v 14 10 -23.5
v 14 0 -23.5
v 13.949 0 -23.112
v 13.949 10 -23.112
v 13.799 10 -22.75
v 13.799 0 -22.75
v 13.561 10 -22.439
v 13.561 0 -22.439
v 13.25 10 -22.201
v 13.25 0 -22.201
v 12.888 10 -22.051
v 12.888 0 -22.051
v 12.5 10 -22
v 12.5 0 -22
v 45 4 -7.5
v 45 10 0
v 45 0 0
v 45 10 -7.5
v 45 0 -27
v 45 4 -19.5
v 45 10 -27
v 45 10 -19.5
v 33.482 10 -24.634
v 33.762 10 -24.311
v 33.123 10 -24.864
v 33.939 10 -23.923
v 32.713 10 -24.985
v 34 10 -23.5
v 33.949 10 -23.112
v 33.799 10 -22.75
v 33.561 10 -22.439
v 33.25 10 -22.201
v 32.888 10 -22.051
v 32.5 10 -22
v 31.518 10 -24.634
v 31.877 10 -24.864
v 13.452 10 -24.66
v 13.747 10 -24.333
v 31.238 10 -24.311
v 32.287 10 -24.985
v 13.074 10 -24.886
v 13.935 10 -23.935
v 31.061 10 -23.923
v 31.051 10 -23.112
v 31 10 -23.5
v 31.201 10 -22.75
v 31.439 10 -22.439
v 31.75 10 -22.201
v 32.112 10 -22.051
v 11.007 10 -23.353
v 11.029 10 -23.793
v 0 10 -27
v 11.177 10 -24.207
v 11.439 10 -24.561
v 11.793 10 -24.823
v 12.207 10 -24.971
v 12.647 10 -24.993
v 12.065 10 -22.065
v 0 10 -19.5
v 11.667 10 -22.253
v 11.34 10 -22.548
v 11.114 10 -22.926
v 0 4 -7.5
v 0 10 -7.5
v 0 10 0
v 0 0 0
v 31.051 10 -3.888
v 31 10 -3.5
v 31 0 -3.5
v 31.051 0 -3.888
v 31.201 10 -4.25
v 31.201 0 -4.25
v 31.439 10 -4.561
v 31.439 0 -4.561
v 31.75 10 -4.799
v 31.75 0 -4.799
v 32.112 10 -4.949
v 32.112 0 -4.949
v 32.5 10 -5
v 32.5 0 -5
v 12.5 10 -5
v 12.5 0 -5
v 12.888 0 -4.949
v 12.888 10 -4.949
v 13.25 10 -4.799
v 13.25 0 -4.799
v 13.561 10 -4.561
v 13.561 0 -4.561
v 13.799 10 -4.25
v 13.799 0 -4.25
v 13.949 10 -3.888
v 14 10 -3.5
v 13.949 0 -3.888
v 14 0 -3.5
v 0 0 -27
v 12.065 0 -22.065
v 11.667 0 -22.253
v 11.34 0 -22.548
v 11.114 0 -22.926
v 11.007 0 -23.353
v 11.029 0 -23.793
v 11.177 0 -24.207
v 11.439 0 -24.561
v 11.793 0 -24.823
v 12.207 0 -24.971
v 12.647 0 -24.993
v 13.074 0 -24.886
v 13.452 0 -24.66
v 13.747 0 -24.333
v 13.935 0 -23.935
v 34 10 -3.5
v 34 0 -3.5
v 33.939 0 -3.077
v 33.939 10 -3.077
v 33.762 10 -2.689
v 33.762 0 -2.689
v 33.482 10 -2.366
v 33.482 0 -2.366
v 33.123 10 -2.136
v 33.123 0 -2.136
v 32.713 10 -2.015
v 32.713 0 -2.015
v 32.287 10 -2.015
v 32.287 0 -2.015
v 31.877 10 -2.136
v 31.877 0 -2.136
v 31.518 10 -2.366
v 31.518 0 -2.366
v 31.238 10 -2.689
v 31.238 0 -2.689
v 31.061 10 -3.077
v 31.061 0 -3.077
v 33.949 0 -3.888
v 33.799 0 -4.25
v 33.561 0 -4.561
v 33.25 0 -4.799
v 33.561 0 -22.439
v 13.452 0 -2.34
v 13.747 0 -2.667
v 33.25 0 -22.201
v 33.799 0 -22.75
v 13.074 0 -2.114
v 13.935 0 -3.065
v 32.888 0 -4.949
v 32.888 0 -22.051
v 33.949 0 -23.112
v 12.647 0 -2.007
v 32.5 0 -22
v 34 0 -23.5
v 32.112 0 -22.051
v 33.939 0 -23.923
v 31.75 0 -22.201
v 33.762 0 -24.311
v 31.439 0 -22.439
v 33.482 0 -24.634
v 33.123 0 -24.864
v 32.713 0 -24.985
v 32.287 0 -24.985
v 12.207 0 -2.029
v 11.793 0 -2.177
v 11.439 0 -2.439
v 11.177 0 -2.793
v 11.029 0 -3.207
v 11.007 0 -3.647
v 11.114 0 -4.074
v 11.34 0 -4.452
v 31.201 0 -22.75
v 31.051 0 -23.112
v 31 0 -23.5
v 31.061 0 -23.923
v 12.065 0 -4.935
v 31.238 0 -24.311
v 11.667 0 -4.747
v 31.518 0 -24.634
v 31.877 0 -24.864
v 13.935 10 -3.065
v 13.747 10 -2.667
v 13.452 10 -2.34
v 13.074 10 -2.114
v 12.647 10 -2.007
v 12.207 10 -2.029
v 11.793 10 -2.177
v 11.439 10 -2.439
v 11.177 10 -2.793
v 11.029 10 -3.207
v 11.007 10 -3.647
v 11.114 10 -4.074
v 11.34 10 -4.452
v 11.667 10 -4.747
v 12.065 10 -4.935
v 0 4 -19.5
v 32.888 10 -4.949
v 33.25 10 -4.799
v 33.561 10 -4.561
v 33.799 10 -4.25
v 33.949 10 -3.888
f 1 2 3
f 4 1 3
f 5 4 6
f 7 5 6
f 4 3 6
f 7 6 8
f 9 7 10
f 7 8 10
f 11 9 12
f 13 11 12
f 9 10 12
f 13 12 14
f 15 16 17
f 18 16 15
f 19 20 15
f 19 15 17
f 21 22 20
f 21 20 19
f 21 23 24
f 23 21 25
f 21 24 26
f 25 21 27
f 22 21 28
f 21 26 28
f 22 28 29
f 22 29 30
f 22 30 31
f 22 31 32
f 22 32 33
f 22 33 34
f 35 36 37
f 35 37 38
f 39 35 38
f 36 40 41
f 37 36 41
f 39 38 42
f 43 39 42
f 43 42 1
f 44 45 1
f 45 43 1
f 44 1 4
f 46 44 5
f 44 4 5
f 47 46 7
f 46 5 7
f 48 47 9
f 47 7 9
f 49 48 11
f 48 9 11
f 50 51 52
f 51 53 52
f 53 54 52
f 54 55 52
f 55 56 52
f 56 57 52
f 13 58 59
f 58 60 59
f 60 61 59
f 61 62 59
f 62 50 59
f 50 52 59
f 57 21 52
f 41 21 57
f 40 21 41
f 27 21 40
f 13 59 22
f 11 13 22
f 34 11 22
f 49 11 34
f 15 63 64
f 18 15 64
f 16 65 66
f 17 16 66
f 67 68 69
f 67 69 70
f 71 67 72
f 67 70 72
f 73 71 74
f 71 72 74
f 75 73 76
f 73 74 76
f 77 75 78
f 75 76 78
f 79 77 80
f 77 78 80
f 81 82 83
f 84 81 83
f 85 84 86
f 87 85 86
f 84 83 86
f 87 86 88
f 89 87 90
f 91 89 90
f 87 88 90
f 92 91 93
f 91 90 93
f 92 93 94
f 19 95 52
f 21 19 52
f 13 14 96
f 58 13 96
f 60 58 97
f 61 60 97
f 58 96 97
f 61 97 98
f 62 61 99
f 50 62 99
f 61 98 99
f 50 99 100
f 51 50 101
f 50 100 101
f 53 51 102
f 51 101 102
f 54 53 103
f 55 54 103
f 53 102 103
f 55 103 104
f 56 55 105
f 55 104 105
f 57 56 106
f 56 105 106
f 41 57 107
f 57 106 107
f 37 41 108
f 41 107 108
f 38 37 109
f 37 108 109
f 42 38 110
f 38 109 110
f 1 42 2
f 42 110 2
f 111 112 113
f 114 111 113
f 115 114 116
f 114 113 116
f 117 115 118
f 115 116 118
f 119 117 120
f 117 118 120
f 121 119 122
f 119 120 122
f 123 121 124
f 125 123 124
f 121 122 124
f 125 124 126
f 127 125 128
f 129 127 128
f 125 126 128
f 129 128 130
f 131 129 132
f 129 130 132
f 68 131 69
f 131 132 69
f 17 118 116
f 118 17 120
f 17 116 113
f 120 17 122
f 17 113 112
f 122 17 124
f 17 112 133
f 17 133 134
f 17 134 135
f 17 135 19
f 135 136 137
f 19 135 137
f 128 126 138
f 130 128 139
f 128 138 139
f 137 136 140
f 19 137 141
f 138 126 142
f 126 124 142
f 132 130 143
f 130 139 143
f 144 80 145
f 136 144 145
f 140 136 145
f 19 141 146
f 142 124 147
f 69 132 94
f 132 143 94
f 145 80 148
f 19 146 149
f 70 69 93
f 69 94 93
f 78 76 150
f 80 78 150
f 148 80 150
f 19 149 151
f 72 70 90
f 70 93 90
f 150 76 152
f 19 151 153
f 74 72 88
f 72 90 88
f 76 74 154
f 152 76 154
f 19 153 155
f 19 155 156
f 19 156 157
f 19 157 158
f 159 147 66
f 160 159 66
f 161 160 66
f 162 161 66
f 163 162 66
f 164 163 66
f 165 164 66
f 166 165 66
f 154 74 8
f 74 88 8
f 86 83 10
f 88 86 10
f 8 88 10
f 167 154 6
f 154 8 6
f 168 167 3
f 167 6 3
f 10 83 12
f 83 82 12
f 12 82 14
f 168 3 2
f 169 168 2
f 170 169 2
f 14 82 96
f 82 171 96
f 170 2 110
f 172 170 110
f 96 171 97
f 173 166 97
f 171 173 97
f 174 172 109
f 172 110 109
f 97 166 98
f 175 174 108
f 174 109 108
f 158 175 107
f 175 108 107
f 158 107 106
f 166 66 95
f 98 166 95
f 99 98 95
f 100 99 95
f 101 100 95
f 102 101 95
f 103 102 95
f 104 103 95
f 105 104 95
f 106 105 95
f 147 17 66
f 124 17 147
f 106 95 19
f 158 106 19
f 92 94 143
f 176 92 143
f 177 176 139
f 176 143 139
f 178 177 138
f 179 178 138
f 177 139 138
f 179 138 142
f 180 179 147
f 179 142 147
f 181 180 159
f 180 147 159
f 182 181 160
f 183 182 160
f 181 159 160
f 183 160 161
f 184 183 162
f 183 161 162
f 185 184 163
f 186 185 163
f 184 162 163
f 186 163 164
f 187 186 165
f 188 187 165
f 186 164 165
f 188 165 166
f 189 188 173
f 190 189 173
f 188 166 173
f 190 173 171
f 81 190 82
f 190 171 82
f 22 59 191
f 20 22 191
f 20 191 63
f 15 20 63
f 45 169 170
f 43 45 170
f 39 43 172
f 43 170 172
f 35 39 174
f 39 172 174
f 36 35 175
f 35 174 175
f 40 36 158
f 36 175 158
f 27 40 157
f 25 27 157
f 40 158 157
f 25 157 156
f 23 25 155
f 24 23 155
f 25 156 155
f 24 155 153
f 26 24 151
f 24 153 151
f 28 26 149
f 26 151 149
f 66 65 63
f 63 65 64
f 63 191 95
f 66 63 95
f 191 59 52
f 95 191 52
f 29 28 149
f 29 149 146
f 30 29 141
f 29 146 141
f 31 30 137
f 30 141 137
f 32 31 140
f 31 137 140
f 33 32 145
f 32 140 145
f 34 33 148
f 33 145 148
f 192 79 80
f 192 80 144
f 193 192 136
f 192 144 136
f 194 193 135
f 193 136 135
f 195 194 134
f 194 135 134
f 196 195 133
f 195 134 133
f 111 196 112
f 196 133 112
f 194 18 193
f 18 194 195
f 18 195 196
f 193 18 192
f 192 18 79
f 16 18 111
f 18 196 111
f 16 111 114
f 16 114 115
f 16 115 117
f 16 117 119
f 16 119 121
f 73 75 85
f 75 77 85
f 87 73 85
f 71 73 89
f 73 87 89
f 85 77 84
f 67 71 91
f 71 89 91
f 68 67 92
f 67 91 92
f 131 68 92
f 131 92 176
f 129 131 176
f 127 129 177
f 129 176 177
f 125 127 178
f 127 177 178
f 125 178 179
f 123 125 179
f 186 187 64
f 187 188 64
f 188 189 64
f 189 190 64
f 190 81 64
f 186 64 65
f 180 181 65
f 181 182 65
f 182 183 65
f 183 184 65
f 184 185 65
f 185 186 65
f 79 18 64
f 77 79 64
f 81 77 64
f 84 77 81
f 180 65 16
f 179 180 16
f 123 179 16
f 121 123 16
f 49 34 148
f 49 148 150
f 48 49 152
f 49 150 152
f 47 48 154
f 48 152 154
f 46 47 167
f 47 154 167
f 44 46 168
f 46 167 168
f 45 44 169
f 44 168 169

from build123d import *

# Parameters (mm, degrees)
BOSS_EXTRUDE1_DEPTH = 45
CUT_EXTRUDE1_DEPTH  = 45


with BuildPart() as part:
    # Sketch1 → Boss-Extrude1 (new body)
    with BuildSketch(Plane(origin=(0, 0, 0), x_dir=(0, 0, -1), z_dir=(1, 0, 0))):
        Polygon((0, 0), (27, 0), (27, 10), (19.5, 10), (19.5, 4), (7.5, 4), (7.5, 10), (0, 10), align=None)
    extrude(amount=BOSS_EXTRUDE1_DEPTH)

    # Sketch2 → Cut-Extrude1 (cut)
    with BuildSketch(Plane.XZ):
        with BuildLine():
            ThreePointArc((31, -3.5), (31.439339828, -4.560660172), (32.5, -5))
            Line((32.5, -5), (32.5, -3.5))
            Line((32.5, -3.5), (31, -3.5))
        make_face()
        with BuildLine():
            Line((32.5, -3.5), (32.5, -5))
            ThreePointArc((32.5, -5), (33.560660172, -4.560660172), (34, -3.5))
            ThreePointArc((34, -3.5), (32.5, -2), (31, -3.5))
            Line((31, -3.5), (32.5, -3.5))
        make_face()
        with BuildLine():
            ThreePointArc((32.5, -22), (31.439339828, -22.439339828), (31, -23.5))
            Line((31, -23.5), (32.5, -23.5))
            Line((32.5, -23.5), (32.5, -22))
        make_face()
        with BuildLine():
            Line((32.5, -23.5), (31, -23.5))
            ThreePointArc((31, -23.5), (32.5, -25), (34, -23.5))
            ThreePointArc((34, -23.5), (33.560660172, -22.439339828), (32.5, -22))
            Line((32.5, -22), (32.5, -23.5))
        make_face()
        with BuildLine():
            Line((12.5, -22), (12.5, -23.5))
            Line((12.5, -23.5), (14, -23.5))
            ThreePointArc((14, -23.5), (13.560660172, -22.439339828), (12.5, -22))
        make_face()
        with BuildLine():
            Line((14, -23.5), (12.5, -23.5))
            Line((12.5, -23.5), (12.5, -22))
            ThreePointArc((12.5, -22), (11.439339828, -24.560660172), (14, -23.5))
        make_face()
        with BuildLine():
            ThreePointArc((14, -3.5), (11.439339828, -2.439339828), (12.5, -5))
            Line((12.5, -5), (12.5, -3.5))
            Line((12.5, -3.5), (14, -3.5))
        make_face()
        with BuildLine():
            Line((12.5, -3.5), (12.5, -5))
            ThreePointArc((12.5, -5), (13.560660172, -4.560660172), (14, -3.5))
            Line((14, -3.5), (12.5, -3.5))
        make_face()
    extrude(amount=-CUT_EXTRUDE1_DEPTH, mode=Mode.SUBTRACT)


solid = part.part
